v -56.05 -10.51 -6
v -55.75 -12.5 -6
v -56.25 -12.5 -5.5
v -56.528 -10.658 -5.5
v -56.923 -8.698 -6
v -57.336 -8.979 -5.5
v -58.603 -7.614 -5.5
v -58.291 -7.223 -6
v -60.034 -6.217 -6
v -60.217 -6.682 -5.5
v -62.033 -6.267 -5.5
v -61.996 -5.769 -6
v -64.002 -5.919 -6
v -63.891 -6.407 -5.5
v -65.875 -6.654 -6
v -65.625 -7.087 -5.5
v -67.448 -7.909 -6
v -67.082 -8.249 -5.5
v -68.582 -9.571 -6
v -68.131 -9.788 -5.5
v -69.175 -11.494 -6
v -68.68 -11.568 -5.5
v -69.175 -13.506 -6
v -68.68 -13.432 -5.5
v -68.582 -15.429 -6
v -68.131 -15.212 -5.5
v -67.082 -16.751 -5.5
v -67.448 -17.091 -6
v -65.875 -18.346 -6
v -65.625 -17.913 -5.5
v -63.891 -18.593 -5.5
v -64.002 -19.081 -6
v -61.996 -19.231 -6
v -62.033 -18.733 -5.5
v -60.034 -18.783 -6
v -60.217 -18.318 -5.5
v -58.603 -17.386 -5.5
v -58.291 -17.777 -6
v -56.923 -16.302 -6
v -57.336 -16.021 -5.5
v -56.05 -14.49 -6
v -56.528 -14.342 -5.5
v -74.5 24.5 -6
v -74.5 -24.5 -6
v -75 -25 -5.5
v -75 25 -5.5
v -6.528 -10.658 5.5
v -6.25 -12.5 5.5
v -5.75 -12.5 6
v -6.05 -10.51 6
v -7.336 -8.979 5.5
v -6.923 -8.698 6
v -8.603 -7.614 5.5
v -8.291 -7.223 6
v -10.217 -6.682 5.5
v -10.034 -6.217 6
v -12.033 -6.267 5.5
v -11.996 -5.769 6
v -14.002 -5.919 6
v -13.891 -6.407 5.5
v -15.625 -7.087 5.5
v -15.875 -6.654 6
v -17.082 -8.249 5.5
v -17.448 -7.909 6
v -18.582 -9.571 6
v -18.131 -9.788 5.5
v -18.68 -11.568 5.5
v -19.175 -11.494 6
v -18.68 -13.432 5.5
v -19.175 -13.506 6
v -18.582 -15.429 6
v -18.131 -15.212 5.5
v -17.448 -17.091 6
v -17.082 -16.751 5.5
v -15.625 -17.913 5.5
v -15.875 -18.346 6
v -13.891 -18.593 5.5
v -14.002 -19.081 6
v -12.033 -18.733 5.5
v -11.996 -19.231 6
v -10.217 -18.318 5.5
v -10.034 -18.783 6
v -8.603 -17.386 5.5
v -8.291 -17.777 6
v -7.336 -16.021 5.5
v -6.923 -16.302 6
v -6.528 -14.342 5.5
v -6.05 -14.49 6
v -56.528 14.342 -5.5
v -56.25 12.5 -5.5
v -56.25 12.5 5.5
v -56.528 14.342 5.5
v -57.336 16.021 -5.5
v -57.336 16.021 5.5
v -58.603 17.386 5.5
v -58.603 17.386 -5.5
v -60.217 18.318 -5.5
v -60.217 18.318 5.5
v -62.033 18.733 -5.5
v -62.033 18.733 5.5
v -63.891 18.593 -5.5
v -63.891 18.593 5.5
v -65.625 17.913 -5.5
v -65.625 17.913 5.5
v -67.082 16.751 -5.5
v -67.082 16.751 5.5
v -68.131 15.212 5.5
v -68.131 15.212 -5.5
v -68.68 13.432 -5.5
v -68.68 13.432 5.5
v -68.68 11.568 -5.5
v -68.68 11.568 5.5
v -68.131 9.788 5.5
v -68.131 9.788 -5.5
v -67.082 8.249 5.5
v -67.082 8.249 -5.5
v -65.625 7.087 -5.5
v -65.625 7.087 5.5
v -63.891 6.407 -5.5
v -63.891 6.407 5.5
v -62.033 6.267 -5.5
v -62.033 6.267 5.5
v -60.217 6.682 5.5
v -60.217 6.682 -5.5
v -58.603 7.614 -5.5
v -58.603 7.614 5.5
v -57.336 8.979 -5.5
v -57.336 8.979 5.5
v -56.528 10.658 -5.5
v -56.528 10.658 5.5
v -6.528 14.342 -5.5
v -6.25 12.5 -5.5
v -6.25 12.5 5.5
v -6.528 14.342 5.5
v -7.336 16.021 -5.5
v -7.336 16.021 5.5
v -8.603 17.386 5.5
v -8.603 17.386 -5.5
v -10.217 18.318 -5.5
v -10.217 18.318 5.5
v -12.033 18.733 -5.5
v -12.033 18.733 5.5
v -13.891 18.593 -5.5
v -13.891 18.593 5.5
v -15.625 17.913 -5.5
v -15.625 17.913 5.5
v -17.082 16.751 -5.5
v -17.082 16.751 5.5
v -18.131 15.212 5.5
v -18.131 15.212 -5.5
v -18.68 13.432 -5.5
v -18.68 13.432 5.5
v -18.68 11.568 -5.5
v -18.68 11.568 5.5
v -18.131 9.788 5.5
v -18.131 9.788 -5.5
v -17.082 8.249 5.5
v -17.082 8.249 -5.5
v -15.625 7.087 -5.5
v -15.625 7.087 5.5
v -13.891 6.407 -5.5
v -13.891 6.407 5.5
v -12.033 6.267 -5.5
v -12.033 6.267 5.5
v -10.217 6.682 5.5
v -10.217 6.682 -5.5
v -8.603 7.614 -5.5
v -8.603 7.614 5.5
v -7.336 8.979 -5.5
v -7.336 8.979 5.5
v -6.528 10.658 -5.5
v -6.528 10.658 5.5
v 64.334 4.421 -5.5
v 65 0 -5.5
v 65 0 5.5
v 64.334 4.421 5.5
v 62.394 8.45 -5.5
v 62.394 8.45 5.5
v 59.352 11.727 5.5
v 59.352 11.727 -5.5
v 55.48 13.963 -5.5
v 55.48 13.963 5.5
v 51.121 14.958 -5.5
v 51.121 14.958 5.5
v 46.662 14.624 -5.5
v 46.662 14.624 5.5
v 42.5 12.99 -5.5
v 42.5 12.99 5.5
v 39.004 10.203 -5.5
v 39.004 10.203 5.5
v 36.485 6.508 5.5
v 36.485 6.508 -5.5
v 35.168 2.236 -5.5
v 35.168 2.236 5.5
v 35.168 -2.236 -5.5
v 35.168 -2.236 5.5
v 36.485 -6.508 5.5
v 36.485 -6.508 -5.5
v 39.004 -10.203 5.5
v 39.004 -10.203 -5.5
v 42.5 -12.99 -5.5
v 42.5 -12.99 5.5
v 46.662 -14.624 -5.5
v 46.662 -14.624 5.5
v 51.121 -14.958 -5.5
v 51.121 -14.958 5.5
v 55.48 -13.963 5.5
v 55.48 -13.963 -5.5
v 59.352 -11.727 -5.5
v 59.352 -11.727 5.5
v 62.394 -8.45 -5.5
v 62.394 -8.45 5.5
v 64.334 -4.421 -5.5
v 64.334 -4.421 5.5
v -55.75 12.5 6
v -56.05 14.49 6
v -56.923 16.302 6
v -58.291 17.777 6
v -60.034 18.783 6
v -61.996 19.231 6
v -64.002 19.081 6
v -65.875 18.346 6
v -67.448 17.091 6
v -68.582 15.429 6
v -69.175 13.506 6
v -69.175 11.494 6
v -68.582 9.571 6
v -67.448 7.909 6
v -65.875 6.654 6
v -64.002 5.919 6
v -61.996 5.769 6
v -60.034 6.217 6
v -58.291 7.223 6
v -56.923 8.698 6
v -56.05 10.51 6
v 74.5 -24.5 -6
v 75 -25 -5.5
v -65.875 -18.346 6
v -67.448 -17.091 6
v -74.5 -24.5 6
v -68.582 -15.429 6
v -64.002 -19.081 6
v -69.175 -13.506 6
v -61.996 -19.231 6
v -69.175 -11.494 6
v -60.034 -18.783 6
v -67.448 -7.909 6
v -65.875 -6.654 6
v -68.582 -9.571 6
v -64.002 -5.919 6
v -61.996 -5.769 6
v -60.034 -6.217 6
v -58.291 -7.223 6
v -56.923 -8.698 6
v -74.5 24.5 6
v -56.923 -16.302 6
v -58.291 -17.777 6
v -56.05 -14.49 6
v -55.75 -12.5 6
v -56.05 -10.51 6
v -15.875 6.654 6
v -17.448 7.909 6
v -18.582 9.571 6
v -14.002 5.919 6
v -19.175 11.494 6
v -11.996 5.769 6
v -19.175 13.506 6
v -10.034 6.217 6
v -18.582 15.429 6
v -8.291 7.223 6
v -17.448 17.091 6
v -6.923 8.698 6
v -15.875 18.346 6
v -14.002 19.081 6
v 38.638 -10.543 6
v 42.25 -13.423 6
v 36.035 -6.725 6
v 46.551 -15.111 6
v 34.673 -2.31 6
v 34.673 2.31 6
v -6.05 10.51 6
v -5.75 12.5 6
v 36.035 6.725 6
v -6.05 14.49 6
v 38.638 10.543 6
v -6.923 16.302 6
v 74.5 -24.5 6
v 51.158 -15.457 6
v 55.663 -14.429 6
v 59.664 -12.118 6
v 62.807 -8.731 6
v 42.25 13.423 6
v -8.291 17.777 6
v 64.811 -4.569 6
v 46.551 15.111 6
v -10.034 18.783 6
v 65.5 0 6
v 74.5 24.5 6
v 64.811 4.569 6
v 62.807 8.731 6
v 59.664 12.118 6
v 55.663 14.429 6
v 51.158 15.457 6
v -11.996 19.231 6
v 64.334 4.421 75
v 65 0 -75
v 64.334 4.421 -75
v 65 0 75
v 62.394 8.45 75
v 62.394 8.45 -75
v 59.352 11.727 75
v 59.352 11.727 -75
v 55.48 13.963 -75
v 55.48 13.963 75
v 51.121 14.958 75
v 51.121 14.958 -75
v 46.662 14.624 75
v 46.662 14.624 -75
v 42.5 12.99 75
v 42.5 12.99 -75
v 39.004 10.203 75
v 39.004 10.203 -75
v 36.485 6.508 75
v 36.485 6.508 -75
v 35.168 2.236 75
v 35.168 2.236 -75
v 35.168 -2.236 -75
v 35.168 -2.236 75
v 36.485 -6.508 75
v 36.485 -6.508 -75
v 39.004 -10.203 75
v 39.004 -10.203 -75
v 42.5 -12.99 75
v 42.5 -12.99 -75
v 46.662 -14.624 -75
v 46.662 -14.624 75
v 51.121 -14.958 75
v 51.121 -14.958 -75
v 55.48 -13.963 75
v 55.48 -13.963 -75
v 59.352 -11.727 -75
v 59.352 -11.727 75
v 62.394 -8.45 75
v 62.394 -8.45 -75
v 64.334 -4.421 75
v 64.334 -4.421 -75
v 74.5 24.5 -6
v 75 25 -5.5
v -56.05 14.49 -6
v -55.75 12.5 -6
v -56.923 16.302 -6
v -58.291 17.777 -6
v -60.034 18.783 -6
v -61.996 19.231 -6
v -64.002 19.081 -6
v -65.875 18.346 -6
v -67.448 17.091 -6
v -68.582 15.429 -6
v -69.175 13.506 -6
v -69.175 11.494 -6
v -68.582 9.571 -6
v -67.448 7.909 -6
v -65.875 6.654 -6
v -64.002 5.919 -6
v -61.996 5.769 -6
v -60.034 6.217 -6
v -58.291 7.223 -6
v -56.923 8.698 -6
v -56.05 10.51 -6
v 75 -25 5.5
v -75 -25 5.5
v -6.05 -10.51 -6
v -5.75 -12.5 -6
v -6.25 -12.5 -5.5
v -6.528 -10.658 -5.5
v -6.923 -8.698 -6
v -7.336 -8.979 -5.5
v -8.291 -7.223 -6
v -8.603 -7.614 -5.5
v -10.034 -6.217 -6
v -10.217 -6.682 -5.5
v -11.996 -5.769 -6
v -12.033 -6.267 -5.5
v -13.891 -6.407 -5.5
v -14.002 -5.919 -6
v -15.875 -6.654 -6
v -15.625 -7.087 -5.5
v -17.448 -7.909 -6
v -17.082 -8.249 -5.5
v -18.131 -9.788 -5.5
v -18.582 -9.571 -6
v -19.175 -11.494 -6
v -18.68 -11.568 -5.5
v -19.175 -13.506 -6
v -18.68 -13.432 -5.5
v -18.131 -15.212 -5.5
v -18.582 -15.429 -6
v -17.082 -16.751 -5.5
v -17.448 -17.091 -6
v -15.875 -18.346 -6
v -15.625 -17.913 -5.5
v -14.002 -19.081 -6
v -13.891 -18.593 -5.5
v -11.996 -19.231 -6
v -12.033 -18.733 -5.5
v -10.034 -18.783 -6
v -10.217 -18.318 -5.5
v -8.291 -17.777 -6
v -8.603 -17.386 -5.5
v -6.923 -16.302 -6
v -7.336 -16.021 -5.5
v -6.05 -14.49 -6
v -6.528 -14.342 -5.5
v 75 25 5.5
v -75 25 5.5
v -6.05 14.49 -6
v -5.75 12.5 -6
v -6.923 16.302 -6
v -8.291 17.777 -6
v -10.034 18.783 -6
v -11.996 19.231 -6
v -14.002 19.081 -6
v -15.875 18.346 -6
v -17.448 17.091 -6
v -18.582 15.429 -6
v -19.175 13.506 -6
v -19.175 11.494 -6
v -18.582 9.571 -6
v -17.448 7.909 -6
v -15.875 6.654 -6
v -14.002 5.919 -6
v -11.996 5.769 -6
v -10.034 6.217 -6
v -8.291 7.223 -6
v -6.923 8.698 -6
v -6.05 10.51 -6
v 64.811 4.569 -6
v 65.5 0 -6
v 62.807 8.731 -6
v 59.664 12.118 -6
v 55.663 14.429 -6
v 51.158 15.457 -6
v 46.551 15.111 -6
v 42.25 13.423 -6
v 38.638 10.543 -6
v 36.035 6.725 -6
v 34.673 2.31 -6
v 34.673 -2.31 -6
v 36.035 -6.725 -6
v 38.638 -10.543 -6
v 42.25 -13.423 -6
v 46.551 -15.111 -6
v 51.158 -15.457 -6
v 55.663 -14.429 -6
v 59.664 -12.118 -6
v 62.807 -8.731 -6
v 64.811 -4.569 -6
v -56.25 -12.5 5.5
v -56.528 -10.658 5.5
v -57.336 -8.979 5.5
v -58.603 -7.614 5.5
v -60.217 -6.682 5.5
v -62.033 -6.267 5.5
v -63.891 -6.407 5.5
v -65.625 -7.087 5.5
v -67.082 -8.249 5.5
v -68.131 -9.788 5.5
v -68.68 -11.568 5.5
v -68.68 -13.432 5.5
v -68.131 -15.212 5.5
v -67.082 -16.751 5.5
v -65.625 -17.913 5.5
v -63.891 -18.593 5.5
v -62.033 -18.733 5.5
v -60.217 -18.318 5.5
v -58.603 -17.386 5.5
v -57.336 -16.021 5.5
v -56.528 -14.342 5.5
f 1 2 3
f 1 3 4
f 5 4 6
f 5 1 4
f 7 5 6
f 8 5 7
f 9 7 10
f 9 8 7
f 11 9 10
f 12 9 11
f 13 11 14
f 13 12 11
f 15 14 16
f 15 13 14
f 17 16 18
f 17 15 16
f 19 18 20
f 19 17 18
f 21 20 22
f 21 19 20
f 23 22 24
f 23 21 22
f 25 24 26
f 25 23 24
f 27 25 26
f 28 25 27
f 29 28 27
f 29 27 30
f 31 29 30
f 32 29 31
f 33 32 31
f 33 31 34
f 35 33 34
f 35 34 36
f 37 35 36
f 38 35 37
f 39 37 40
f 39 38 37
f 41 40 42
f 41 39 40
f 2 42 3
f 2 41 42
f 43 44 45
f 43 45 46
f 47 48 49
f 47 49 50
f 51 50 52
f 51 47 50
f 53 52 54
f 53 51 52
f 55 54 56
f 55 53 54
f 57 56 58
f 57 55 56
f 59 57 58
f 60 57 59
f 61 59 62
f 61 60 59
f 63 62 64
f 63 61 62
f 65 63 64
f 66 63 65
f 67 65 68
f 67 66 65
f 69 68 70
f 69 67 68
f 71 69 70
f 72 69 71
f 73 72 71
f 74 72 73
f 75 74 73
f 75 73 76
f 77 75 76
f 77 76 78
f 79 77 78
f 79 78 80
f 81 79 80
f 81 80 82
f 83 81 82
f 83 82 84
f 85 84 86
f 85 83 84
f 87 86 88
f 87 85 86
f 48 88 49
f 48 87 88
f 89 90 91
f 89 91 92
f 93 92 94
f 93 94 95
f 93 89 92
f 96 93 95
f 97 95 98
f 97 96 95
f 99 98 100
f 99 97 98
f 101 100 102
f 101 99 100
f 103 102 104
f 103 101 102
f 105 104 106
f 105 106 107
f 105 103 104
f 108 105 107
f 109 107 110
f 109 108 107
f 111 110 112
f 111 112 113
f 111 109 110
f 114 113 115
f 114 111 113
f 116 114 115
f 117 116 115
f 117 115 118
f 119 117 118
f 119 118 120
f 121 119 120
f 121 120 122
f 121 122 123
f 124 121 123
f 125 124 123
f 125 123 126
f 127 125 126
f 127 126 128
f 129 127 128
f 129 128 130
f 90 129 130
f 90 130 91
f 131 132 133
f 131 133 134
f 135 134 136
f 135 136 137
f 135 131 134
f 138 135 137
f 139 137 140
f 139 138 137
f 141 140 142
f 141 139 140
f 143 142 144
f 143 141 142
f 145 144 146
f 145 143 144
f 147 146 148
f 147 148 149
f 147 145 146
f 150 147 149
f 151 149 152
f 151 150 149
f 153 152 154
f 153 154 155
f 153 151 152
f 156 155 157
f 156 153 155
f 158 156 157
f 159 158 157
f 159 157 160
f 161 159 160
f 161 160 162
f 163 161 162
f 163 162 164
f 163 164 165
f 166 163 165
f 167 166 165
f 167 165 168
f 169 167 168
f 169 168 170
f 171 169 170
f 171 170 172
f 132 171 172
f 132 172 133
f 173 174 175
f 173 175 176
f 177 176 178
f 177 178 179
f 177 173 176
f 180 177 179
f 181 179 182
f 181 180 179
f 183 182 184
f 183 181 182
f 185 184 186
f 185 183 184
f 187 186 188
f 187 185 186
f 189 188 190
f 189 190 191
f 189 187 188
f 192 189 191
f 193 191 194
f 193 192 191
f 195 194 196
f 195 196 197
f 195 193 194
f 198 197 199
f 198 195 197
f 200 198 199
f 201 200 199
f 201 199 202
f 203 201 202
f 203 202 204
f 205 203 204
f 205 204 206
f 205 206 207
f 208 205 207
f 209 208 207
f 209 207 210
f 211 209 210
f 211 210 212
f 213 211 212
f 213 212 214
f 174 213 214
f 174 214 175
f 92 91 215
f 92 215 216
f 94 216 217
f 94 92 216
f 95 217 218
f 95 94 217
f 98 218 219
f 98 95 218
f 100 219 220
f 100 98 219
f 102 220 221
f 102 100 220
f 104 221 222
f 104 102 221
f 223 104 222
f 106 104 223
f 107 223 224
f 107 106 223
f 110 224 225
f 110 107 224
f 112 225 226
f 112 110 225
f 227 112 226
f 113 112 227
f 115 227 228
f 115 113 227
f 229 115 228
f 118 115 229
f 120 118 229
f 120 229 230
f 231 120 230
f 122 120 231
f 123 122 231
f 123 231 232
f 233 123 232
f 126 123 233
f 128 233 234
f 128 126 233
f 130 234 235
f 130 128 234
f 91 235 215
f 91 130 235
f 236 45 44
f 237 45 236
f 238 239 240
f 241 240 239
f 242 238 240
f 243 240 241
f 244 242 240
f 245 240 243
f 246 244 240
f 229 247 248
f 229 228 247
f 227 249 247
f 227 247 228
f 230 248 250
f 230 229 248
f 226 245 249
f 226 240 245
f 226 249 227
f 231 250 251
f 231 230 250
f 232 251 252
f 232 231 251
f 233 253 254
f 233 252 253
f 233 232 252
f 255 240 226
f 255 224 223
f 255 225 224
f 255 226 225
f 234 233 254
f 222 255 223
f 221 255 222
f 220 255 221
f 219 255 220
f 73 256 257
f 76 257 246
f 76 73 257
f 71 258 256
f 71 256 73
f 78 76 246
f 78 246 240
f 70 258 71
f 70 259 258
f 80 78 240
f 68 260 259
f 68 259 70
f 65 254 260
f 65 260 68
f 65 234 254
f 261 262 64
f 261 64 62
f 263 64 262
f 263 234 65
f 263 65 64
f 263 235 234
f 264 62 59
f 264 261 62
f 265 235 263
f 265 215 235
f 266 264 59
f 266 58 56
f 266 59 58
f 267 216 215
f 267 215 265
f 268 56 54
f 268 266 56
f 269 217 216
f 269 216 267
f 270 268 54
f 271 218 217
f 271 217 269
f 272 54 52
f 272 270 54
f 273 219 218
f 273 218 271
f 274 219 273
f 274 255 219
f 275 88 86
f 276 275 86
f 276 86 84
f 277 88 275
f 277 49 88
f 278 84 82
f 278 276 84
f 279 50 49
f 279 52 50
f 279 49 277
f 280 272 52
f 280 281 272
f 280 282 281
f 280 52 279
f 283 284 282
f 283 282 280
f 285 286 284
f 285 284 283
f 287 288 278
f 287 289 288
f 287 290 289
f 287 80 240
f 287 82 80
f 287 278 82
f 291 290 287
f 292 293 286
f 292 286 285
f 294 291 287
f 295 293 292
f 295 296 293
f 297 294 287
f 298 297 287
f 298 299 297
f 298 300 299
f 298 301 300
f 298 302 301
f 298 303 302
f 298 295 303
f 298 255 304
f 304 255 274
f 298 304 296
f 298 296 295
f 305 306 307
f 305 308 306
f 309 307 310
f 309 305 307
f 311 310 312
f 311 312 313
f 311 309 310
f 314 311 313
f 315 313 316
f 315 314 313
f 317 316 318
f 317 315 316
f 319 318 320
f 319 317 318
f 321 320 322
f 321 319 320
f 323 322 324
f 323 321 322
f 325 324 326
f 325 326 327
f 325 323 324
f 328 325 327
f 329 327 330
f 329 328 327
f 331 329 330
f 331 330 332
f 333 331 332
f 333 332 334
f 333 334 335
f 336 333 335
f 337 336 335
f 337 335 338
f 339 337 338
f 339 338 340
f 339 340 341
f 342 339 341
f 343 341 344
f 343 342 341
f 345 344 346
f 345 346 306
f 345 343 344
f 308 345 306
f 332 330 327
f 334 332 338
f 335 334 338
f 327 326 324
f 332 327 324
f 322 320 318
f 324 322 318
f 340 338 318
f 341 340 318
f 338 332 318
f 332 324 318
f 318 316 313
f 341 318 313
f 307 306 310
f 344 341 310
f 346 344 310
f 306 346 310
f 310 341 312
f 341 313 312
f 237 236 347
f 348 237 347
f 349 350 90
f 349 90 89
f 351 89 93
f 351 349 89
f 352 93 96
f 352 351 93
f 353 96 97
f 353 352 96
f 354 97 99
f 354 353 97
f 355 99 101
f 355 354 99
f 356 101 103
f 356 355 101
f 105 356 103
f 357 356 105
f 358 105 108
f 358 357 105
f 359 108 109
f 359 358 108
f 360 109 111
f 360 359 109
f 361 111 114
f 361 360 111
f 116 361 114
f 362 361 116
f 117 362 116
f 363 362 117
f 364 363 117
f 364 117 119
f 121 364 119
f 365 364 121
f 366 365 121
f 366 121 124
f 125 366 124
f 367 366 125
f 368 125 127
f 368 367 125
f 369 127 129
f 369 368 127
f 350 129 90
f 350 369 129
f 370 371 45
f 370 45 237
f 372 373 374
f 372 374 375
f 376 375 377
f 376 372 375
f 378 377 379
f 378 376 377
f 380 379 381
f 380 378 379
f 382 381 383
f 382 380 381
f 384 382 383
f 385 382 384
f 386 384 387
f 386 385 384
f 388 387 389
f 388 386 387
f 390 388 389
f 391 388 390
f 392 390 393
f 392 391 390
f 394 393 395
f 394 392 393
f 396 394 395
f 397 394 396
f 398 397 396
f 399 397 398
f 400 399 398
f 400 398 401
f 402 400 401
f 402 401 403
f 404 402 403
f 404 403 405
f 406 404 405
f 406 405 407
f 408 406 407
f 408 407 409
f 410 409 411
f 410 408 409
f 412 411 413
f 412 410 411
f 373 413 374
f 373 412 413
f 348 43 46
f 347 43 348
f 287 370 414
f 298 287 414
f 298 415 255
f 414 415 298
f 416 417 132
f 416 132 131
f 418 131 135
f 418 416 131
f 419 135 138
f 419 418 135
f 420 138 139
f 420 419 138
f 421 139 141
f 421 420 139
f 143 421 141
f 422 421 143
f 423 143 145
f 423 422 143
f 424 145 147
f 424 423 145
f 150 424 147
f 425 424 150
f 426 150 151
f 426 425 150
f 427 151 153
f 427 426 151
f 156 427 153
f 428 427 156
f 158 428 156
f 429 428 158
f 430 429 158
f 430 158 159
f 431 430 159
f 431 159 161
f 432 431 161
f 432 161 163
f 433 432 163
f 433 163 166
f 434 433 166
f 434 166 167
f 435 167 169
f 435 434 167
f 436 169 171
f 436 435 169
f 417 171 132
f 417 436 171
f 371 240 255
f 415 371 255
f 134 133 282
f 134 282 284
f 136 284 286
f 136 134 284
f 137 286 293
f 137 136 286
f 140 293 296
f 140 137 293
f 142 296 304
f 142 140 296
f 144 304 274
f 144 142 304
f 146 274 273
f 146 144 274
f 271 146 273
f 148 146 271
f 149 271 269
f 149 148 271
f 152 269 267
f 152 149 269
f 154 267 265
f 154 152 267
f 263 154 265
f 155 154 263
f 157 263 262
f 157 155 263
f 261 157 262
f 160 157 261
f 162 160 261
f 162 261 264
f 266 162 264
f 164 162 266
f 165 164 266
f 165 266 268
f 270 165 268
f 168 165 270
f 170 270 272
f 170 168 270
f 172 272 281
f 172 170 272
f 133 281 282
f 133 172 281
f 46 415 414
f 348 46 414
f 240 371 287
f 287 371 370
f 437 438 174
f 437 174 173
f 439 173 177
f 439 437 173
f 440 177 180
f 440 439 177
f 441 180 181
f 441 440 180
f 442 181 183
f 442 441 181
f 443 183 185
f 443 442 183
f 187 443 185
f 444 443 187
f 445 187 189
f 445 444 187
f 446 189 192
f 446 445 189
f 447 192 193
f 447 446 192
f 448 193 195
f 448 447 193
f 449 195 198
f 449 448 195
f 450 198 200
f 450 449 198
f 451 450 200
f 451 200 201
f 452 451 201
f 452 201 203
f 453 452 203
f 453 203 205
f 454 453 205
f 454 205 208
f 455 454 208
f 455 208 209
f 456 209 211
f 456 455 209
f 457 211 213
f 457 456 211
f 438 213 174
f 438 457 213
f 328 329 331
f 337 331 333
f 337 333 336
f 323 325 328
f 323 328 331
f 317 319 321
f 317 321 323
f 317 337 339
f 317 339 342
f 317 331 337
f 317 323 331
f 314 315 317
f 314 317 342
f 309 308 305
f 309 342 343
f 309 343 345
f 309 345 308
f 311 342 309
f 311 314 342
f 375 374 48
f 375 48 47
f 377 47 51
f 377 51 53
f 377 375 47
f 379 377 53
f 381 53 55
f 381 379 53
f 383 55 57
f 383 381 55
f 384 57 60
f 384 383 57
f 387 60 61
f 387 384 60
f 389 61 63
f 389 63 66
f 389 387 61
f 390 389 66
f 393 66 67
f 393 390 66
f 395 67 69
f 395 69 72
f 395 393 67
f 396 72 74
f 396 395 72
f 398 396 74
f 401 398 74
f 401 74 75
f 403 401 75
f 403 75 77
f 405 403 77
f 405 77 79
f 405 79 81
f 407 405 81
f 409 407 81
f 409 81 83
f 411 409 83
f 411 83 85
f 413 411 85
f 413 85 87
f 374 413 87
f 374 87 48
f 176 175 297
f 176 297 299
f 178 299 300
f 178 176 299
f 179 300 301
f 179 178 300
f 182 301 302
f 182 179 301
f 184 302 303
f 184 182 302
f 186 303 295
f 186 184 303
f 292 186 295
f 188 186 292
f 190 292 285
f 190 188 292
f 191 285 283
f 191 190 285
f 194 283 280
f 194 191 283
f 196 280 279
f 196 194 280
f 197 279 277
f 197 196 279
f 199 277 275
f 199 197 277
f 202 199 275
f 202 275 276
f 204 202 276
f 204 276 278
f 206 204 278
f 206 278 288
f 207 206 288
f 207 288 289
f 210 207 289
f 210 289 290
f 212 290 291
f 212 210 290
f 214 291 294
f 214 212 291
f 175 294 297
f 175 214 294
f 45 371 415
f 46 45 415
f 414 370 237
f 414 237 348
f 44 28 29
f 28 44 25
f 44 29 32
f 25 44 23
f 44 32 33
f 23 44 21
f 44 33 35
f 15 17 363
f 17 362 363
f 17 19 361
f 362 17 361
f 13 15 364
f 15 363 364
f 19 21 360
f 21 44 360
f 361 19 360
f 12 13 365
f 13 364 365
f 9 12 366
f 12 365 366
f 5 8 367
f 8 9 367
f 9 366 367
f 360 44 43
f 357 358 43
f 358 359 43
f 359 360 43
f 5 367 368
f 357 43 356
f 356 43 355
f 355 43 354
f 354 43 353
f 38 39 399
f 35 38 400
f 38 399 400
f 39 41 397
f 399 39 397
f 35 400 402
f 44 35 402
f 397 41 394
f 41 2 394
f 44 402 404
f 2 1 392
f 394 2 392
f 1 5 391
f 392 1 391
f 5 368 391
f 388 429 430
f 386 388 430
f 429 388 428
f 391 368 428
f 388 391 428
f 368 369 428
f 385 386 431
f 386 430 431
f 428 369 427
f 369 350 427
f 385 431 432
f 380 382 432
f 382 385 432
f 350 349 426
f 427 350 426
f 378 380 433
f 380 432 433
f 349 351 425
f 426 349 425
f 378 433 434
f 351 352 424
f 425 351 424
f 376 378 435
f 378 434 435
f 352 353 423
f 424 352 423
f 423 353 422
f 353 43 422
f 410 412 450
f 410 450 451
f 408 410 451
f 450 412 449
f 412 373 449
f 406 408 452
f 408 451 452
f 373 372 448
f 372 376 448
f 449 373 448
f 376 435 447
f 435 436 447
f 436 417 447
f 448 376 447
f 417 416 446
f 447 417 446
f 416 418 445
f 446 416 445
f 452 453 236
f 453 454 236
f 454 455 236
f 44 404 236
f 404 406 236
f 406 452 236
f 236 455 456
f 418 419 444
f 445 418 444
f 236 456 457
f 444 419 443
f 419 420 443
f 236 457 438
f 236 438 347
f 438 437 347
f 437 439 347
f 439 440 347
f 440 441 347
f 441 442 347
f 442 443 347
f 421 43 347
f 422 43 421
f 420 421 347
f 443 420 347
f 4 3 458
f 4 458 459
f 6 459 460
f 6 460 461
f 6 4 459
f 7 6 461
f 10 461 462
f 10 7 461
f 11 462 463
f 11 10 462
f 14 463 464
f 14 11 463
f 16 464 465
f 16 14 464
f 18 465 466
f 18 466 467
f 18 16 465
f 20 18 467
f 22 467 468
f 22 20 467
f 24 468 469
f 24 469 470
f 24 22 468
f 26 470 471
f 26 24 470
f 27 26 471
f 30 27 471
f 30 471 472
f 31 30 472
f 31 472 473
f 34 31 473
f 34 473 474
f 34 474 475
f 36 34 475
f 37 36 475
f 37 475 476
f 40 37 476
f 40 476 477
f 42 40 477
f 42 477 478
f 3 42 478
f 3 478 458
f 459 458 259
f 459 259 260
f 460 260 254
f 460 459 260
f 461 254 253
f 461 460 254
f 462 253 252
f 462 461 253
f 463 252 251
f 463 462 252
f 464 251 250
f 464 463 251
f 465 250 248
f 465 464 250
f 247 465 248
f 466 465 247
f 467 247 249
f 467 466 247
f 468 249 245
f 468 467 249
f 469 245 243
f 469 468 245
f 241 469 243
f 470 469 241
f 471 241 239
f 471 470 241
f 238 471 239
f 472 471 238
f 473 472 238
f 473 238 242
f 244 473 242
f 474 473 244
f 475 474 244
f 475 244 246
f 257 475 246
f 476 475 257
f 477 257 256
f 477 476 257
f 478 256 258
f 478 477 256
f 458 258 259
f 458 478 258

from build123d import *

# Parameters (mm, degrees)
F0_W     = 150
F0_H     = 50
F0_R     = 6.25
F0_R_2   = 15
F1_DEPTH = 6
F2_SIZE  = 0.5
F3_DEPTH = 75


with BuildPart() as f1:
    # F0 (on Top) → F1 (new body, symmetric)
    with BuildSketch(Plane.XY):
        Rectangle(F0_W, F0_H)
        with Locations((-62.5, -12.5)):
            Circle(F0_R, mode=Mode.SUBTRACT)
        with Locations((-12.5, -12.5)):
            Circle(F0_R, mode=Mode.SUBTRACT)
        with Locations((-62.5, 12.5)):
            Circle(F0_R, mode=Mode.SUBTRACT)
        with Locations((-12.5, 12.5)):
            Circle(F0_R, mode=Mode.SUBTRACT)
        with Locations((50, 0)):
            Circle(F0_R_2, mode=Mode.SUBTRACT)
    extrude(amount=F1_DEPTH, both=True)

    # F2
    f2_edges = [f1.edges().sort_by_distance(p)[0] for p in [
        (0, -25, 6),
        (75, 0, 6),
        (0, 25, 6),
        (-75, 0, 6),
        (-68.75, -12.5, 6),
        (-18.75, -12.5, 6),
        (-68.75, 12.5, 6),
        (-18.75, 12.5, 6),
        (35, 0, 6),
        (0, -25, -6),
        (75, 0, -6),
        (0, 25, -6),
        (-75, 0, -6),
        (-68.75, -12.5, -6),
        (-18.75, -12.5, -6),
        (-68.75, 12.5, -6),
        (-18.75, 12.5, -6),
        (35, 0, -6),
    ]]
    chamfer(f2_edges, length=F2_SIZE)


with BuildPart() as f3:
    # F0 (on Top) → F3 (new body, symmetric)
    with BuildSketch(Plane.XY):
        with Locations((50, 0)):
            Circle(F0_R_2)
    extrude(amount=F3_DEPTH, both=True)


solid = Compound([f1.part, f3.part])
